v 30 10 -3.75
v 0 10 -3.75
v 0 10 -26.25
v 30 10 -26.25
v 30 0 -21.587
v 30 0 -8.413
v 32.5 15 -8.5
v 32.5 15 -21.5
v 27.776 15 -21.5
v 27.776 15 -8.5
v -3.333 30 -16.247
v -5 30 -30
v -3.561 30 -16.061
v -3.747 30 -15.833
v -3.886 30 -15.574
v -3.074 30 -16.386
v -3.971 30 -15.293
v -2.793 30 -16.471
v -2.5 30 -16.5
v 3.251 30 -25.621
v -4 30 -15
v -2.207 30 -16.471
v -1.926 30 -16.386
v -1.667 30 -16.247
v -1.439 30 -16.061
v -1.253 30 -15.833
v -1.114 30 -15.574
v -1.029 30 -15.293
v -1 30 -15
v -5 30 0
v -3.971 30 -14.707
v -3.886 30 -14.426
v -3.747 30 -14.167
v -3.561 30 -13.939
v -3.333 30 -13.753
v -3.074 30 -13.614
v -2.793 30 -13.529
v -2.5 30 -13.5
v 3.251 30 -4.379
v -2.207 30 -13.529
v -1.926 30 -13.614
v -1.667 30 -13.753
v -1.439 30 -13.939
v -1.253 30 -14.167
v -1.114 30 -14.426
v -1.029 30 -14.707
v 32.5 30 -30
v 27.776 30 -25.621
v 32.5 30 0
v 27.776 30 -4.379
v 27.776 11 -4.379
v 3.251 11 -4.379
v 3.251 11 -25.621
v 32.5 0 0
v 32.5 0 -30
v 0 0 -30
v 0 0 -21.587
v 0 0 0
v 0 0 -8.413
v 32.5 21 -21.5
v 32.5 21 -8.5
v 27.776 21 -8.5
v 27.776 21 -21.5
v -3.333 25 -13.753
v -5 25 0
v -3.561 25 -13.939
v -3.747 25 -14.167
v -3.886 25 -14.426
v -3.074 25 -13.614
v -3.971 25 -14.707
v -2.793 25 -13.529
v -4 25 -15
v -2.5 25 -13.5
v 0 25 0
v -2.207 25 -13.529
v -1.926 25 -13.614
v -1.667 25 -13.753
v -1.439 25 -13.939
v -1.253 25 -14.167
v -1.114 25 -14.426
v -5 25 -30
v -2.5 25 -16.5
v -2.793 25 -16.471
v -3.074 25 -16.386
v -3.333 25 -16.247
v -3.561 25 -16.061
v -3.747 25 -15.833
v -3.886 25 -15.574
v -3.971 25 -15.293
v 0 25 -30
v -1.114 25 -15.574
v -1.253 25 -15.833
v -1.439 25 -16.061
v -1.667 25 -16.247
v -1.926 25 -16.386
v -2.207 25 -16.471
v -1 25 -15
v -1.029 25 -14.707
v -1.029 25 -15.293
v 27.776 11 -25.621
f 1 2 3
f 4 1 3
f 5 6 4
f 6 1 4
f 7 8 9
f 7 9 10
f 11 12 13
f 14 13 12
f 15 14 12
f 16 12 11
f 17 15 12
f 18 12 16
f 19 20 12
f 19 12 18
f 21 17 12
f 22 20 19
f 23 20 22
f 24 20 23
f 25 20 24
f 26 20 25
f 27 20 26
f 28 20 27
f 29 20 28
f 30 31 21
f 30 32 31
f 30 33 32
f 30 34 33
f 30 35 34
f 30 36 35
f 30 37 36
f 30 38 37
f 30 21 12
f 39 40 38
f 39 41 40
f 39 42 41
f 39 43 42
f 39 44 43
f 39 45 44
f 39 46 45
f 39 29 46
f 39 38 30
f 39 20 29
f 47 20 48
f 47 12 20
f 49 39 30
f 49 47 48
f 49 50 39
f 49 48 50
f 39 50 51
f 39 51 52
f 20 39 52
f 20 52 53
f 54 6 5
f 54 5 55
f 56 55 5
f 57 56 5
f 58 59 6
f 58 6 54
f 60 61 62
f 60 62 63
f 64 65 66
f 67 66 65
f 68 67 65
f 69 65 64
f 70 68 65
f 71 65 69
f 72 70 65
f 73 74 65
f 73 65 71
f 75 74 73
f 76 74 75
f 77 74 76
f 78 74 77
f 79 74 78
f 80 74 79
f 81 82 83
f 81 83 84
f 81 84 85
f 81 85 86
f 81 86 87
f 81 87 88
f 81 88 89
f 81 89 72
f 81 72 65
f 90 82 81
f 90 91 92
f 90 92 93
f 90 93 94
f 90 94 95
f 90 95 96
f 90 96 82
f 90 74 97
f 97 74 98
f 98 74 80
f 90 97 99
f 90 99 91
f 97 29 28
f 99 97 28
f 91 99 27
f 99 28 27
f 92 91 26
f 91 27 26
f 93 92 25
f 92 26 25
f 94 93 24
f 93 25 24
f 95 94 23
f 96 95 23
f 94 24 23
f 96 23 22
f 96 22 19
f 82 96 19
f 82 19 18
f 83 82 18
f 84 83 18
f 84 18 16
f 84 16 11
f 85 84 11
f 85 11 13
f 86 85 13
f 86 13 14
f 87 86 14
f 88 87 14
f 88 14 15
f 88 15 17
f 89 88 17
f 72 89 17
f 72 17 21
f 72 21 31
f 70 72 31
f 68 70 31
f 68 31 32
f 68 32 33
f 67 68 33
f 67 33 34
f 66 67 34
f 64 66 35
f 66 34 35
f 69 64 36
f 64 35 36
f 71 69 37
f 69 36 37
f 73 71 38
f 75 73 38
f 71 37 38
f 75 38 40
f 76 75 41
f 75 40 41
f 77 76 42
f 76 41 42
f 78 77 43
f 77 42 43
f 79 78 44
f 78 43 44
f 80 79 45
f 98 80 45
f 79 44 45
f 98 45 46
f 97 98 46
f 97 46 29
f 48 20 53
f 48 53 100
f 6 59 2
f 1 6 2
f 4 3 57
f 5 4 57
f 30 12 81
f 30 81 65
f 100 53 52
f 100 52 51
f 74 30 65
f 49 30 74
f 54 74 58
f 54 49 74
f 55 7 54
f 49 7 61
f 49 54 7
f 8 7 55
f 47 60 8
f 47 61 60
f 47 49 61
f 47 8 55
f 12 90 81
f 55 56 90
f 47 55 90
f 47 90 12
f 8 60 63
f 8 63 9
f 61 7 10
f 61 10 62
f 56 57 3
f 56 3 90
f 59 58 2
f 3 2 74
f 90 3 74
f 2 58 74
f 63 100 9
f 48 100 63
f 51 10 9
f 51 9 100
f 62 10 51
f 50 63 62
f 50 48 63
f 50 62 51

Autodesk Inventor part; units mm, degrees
ref_plane "YZ Plane" through (0, 0, 0) normal (1, 0, 0) x (0, 1, 0)
ref_plane "XZ Plane" through (0, 0, 0) normal (0, 1, 0) x (-1, 0, 0)
ref_plane "XY Plane" through (0, 0, 0) normal (0, 0, 1) x (1, 0, 0)
sketch "Sketch1" plane through (0, 0, 0) normal (1, 0, 0) x (0, 1, 0)
  line L0 (0, 0) -> (30, 0)
  line L1 (30, 0) -> (30, -30)
  line L2 (30, -30) -> (0, -30)
  line L3 (0, -30) -> (0, 0)
  line L4 (0, -8.4131) -> (10, -3.75)
  line L5 (10, -3.75) -> (10, -26.25)
  line L6 (10, -26.25) -> (0, -21.5869)
  point P0 (10, -15)
  point P1 (0, -15)
  dimension "d0" = 30
  dimension "d1" = 30
  dimension "d2" = 10
  dimension "d3" = 22.5
  dimension "d4" = 65
  dimension "d5" = 65
extrude "Extrusion1" add sketch "Sketch1" along normal blind 30 contours L0 L1 L2 L3 L6 L5 L4
sketch "Sketch2" plane through (30, 0, 0) normal (1, 0, 0) x (0, 0, -1)
  line L0 (0, 30) -> (0, 0) projected
  line L1 (21.5869, 0) -> (30, 0) projected
  line L2 (0, 30) -> (30, 30)
  line L3 (30, 30) -> (30, 0)
  line L4 (30, 0) -> (0, 0)
  line L5 (0, 0) -> (0, 30)
  point P0 (21.5869, 0)
extrude "Extrusion2" add sketch "Sketch2" along normal blind 2.5
sketch "Sketch3" plane through (0, 0, 0) normal (-1, 0, 0) x (0, 0, 1)
  line L0 (-30, 0) -> (-30, 30) projected
  line L1 (0, 30) -> (0, 0) projected
  line L2 (-30, 30) -> (0, 30)
  line L3 (0, 30) -> (0, 25)
  line L4 (0, 25) -> (-30, 25)
  line L5 (-30, 25) -> (-30, 30)
  point P0 (0, 30)
  dimension "d10" = 5
extrude "Extrusion3" add sketch "Sketch3" along normal blind 5
sketch "Sketch4" plane through (32.5, 30, 0) normal (0, 1, 0) x (1, 0, 0)
  line L0 (-32.5, 0) -> (-37.5, 0) projected
  line L1 (-32.5, 0) -> (-32.5, 30) construction
  circle A0 centre (-35, 15) radius 1.5
  dimension "d13" = 3
extrude "Extrusion4" cut sketch "Sketch4" against normal through all
sketch "Sketch5" plane through (32.5, 30, 0) normal (0, 1, 0) x (1, 0, 0)
  line L0 (-29.2486, 25.6211) -> (-4.7242, 25.6211)
  line L1 (-4.7242, 25.6211) -> (-4.7242, 4.3789)
  line L2 (-4.7242, 4.3789) -> (-29.2486, 4.3789)
  line L3 (-29.2486, 4.3789) -> (-29.2486, 25.6211)
  line L4 (0, 30) -> (0, 0) projected
  point P0 (-32.5, 0)
  point P1 (0, 15)
  point P2 (-4.7242, 15)
  point P3 (0, 15)
extrude "Extrusion5" cut sketch "Sketch5" against normal blind 19
sketch "Sketch6" plane through (32.5, 0, 0) normal (1, 0, 0) x (0, 0, -1)
  line L0 (25.6211, 11) -> (4.3789, 11) projected
  line L1 (8.5, 21) -> (21.5, 21)
  line L2 (21.5, 21) -> (21.5, 15)
  line L3 (21.5, 15) -> (8.5, 15)
  line L4 (8.5, 15) -> (8.5, 21)
  point P0 (0, 0)
  point P1 (15, 15)
  point P2 (15, 11)
  dimension "d18" = 13
  dimension "d19" = 6
  dimension "d20" = 4
extrude "Extrusion6" cut sketch "Sketch6" against normal up to next
properties part number "Top Sensor Mount"
